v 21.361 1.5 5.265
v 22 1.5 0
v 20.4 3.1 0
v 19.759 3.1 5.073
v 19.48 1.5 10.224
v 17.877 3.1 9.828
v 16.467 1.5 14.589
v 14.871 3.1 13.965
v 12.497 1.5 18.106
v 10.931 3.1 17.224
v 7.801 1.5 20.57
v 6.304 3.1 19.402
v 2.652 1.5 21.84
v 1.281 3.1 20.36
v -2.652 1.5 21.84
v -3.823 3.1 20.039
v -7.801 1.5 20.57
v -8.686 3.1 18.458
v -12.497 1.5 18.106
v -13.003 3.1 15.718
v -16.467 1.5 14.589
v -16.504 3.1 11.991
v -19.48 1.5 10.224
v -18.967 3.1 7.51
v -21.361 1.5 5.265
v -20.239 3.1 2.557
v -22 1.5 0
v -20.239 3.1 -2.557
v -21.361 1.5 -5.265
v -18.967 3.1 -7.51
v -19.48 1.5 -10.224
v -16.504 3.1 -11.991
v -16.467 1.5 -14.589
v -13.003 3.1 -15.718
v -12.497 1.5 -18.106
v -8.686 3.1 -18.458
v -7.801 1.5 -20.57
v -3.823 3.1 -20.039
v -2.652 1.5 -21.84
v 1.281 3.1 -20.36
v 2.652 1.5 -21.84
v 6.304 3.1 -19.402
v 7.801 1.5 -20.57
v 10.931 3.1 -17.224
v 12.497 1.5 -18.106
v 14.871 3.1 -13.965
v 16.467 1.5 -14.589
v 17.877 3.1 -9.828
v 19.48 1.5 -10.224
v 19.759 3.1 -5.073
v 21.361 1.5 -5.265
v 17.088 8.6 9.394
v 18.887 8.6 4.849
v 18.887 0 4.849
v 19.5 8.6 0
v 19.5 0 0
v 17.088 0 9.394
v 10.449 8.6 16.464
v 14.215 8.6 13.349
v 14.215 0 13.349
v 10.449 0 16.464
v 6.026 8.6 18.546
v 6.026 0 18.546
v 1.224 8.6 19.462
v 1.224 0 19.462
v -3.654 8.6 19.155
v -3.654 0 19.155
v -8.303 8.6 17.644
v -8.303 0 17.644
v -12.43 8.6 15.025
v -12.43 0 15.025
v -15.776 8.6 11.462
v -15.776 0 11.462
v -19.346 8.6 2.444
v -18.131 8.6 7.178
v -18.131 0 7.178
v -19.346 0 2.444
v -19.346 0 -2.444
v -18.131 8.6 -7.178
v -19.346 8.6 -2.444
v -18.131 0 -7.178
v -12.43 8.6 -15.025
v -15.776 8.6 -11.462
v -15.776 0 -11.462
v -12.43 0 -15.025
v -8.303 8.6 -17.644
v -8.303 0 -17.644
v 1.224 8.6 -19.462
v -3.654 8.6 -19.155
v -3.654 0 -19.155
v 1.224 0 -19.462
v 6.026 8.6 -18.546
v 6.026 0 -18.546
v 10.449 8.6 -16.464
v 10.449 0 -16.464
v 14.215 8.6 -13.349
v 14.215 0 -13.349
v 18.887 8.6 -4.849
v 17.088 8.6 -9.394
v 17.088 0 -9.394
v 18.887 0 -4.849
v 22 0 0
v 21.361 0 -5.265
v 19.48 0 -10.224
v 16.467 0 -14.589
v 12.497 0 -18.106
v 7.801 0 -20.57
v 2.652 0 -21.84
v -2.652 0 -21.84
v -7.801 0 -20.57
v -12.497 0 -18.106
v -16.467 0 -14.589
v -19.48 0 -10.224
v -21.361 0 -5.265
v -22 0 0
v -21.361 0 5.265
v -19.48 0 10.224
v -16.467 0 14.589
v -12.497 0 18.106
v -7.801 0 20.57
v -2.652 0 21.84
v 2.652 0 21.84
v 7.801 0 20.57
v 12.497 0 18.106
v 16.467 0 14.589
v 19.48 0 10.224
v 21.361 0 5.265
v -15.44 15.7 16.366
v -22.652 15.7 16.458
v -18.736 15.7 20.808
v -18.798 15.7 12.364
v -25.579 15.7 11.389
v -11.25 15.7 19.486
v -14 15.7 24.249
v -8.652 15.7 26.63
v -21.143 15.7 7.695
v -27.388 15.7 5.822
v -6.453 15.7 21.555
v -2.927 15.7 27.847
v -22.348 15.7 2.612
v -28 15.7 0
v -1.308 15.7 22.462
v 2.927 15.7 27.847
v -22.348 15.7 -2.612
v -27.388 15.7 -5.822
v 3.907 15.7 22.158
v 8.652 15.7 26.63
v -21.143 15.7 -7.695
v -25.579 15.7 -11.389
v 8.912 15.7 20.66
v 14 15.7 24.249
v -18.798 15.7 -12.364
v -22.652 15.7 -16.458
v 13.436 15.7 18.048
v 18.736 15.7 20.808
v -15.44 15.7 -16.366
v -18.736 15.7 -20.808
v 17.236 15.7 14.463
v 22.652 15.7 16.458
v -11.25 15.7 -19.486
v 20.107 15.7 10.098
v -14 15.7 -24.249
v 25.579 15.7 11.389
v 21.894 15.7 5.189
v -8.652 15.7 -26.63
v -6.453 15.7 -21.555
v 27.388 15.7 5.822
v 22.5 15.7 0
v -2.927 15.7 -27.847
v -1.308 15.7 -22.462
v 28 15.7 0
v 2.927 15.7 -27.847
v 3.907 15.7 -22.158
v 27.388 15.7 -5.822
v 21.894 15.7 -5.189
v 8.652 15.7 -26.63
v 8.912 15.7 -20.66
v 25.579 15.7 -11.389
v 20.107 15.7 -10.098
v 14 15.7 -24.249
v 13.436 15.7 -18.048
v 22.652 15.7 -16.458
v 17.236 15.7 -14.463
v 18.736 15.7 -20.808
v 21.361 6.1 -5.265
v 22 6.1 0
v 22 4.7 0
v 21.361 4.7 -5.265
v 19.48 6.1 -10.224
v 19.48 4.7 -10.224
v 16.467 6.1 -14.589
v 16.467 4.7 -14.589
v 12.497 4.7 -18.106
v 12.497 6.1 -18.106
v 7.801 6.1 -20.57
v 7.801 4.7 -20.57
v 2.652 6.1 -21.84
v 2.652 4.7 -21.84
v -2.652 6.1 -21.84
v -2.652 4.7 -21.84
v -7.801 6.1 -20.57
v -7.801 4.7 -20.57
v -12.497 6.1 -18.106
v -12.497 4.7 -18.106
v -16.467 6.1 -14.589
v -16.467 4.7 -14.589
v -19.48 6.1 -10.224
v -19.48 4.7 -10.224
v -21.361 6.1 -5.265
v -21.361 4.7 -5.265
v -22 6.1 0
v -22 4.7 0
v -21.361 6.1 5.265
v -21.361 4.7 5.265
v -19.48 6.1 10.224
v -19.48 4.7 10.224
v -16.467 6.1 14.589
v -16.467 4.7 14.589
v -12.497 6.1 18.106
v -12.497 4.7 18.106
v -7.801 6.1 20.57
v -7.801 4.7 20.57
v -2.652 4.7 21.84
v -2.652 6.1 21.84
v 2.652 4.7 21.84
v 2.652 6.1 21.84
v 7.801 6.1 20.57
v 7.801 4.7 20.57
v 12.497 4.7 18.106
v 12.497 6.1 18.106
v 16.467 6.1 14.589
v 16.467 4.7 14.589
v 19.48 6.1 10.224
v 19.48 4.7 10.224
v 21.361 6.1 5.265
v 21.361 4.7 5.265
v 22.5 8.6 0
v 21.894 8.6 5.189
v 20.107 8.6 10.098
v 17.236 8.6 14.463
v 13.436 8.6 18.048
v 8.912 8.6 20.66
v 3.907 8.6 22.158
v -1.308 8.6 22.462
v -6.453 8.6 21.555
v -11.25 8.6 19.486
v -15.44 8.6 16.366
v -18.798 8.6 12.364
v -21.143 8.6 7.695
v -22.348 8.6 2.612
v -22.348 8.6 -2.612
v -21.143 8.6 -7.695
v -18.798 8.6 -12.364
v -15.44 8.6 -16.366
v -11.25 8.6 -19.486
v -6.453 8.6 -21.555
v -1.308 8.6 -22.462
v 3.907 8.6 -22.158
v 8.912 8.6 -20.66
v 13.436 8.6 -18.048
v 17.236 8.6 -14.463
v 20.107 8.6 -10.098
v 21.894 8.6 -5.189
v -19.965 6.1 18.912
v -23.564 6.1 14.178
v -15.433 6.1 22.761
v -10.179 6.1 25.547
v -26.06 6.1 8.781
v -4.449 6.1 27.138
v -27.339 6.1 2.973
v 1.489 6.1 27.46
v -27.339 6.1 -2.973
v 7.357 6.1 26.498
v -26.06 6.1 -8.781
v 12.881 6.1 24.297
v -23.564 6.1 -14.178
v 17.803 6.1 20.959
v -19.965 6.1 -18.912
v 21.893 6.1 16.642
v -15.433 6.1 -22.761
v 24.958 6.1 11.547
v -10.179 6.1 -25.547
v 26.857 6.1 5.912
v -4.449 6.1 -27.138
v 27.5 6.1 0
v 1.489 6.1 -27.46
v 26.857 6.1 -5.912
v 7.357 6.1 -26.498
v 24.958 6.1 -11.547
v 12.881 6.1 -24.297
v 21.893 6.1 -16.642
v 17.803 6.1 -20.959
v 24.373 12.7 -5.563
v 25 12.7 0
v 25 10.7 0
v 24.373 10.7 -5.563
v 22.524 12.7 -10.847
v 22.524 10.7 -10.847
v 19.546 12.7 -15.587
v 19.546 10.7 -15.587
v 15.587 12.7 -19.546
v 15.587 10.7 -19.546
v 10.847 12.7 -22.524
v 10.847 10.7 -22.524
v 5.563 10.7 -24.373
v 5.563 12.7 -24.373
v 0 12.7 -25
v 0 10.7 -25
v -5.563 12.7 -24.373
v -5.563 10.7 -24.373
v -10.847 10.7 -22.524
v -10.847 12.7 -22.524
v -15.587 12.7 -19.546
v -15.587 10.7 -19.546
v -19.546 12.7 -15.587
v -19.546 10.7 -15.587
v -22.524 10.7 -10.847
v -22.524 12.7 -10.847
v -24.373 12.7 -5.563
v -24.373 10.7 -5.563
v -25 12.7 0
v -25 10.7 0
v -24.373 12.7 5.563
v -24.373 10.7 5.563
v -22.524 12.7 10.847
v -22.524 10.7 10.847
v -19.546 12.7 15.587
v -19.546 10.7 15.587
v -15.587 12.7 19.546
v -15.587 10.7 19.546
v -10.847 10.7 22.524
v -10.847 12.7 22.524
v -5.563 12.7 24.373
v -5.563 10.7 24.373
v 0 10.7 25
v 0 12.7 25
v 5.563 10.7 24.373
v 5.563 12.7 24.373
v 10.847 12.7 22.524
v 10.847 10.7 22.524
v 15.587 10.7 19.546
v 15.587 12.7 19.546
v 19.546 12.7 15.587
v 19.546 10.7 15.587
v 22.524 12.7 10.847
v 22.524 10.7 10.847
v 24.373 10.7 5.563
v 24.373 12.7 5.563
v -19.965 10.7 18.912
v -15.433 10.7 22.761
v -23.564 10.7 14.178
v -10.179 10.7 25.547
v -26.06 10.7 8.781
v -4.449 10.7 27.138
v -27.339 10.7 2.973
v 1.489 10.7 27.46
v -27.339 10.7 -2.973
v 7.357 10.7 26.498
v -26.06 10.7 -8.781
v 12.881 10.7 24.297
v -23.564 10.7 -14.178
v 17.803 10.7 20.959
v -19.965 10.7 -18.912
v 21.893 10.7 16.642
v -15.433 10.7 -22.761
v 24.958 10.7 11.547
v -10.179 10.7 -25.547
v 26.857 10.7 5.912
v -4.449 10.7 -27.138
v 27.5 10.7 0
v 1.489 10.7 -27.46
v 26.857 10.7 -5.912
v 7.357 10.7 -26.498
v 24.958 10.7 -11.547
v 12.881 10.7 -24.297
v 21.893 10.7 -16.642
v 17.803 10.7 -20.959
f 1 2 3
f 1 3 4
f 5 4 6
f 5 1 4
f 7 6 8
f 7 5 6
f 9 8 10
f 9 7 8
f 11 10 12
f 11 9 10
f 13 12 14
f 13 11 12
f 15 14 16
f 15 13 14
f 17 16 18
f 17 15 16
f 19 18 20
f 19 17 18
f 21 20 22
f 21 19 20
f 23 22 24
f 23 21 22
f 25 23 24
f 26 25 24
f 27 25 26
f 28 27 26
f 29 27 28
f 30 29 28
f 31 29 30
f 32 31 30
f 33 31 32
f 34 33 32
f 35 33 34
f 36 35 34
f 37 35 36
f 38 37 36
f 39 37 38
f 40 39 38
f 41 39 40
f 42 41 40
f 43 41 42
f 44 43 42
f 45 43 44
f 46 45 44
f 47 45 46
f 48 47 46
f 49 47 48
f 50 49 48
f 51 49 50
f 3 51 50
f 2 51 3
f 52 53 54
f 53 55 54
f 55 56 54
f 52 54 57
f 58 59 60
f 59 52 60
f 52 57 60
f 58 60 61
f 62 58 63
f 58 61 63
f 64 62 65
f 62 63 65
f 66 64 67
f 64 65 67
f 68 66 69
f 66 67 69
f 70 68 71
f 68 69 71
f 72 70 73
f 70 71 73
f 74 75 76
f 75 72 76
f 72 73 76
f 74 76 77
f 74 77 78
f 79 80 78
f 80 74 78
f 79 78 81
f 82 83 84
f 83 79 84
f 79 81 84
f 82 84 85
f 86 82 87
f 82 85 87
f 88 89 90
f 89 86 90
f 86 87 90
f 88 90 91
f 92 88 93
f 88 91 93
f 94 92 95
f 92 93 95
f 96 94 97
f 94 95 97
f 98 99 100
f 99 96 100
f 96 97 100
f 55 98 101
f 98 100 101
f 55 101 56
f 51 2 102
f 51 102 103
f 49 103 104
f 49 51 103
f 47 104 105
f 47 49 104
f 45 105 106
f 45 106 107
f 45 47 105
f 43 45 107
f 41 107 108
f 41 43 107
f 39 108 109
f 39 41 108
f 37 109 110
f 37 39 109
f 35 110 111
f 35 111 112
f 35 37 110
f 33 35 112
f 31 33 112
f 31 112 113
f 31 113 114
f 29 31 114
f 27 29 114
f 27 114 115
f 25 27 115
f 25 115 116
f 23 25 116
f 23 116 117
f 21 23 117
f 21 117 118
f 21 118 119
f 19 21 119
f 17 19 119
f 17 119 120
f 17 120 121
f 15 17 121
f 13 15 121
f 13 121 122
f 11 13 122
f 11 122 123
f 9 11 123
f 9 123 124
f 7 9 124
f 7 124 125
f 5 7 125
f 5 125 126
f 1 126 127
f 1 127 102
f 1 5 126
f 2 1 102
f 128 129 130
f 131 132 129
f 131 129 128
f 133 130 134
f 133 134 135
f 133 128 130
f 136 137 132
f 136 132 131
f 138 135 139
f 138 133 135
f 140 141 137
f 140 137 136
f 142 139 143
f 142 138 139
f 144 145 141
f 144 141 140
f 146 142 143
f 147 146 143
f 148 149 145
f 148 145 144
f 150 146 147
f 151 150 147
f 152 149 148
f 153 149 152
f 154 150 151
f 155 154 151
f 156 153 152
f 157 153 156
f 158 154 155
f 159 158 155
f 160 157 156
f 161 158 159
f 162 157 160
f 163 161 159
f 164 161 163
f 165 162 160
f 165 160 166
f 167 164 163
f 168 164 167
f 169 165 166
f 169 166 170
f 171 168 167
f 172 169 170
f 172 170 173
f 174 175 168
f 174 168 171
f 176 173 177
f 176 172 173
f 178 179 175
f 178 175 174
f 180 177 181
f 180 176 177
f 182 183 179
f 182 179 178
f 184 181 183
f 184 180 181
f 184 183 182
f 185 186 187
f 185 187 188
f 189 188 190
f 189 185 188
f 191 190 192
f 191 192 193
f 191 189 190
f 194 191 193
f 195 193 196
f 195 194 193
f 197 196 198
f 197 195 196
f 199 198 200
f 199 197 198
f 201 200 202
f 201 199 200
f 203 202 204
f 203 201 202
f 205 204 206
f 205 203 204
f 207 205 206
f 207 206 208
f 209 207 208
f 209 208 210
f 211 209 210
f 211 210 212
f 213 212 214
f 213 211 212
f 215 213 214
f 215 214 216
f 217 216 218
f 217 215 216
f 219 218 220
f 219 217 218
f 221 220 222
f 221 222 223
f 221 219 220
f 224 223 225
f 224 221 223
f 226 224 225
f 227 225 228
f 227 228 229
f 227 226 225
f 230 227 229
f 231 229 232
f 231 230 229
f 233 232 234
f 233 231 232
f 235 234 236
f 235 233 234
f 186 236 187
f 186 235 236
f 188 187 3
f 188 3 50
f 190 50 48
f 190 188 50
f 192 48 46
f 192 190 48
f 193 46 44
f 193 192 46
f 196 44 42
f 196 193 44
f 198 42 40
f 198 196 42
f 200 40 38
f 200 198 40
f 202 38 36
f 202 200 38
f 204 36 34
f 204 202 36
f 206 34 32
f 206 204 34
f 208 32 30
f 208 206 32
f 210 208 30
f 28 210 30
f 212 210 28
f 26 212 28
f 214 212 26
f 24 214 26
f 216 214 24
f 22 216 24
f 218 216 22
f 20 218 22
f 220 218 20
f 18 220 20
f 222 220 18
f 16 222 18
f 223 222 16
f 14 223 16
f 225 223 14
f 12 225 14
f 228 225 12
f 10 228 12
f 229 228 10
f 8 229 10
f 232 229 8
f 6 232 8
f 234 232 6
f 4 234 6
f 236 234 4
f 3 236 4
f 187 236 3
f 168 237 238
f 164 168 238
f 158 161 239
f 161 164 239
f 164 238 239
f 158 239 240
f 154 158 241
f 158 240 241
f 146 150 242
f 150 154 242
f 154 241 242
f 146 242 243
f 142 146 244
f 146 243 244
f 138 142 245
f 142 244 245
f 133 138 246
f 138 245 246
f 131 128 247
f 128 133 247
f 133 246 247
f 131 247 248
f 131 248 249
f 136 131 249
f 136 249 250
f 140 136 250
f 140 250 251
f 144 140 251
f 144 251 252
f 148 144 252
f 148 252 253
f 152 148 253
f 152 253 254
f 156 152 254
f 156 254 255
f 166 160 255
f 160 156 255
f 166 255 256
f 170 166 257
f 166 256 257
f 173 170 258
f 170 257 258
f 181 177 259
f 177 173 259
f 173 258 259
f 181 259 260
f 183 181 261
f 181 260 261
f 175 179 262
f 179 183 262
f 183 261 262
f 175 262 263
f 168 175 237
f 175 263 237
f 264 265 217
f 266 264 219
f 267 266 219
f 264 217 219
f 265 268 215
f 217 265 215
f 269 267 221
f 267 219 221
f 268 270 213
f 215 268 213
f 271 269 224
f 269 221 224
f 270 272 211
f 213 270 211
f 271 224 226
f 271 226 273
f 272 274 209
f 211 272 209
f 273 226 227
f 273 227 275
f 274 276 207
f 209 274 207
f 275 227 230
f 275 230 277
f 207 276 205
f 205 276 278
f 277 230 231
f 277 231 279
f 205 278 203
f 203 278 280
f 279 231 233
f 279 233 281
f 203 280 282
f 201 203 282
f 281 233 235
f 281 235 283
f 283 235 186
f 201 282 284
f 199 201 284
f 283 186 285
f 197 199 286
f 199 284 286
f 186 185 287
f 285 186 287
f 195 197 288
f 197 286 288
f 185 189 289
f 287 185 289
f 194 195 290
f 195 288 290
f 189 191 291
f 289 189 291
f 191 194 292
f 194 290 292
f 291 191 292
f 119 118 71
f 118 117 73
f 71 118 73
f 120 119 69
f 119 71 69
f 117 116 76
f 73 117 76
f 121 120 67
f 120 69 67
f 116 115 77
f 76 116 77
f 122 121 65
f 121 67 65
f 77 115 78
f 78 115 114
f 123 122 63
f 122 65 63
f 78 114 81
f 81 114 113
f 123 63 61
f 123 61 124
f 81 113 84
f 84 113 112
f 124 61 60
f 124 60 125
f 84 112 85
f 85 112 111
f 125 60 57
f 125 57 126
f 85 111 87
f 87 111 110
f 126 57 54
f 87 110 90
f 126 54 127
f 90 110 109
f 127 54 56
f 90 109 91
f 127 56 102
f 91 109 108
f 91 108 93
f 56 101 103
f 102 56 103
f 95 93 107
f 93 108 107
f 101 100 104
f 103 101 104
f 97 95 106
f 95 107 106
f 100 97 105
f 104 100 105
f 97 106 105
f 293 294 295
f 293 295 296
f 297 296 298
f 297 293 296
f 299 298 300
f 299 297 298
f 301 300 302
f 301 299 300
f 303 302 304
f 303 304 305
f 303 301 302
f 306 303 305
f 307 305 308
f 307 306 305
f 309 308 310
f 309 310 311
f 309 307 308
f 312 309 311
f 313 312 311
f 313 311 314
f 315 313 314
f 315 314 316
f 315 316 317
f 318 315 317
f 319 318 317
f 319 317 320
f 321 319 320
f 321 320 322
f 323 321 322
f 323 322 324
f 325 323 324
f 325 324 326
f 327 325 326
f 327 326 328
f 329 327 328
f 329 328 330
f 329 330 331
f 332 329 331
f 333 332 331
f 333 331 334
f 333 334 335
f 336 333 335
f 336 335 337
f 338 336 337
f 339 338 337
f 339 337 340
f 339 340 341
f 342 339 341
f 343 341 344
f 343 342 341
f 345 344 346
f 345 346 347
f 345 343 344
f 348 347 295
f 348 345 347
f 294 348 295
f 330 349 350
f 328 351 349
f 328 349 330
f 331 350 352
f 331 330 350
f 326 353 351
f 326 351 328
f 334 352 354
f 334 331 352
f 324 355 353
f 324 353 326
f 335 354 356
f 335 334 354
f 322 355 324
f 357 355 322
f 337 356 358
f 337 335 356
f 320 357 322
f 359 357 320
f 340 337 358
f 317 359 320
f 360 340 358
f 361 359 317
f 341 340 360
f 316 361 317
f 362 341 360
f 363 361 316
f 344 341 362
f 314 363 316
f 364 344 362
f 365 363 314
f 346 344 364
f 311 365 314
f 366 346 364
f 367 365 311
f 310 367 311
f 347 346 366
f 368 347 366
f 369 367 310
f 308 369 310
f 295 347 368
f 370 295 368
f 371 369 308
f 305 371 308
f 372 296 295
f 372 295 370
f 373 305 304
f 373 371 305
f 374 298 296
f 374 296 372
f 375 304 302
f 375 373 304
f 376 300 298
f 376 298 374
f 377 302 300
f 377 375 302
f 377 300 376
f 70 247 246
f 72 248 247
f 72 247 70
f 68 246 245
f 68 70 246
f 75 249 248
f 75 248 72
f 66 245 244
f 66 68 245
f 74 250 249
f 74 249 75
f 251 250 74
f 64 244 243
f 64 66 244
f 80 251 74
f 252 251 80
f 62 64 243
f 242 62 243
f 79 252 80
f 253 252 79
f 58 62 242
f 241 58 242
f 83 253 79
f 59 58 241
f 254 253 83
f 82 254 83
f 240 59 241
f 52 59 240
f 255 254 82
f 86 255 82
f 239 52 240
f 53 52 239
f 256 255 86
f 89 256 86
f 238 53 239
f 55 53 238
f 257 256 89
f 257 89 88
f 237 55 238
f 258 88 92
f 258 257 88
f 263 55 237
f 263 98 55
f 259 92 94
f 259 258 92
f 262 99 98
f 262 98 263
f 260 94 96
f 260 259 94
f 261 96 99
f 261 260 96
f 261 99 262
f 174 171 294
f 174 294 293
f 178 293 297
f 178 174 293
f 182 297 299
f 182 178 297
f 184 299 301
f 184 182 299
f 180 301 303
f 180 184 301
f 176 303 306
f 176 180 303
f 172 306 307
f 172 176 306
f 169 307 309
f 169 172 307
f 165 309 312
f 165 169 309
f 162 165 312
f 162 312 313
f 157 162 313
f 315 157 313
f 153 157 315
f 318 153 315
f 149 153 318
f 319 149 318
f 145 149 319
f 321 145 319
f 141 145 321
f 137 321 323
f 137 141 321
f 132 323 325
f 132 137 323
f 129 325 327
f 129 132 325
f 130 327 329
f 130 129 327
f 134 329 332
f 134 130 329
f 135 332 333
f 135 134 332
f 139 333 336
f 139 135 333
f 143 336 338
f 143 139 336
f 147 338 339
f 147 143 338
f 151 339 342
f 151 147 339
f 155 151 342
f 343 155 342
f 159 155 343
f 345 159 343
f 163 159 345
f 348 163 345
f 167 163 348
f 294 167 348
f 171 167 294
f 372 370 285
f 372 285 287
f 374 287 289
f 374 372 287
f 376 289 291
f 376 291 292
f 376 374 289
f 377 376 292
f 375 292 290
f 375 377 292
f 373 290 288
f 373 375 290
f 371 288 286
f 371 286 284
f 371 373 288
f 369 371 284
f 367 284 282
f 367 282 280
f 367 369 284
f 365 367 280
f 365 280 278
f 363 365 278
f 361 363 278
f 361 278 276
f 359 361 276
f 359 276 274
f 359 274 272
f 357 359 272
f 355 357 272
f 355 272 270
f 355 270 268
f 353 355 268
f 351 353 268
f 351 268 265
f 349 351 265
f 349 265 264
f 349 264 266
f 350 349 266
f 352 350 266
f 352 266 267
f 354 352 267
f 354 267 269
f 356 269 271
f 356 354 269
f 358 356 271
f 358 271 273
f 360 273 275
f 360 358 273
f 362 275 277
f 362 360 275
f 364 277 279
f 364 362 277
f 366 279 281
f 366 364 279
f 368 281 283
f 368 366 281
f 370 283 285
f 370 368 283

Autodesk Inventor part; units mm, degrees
ref_plane "YZ Plane" through (0, 0, 0) normal (1, 0, 0) x (0, 1, 0)
ref_plane "XZ Plane" through (0, 0, 0) normal (0, 1, 0) x (-1, 0, 0)
ref_plane "XY Plane" through (0, 0, 0) normal (0, 0, 1) x (1, 0, 0)
sketch "Sketch1" plane through (0, 0, 0) normal (0, 0, 1) x (1, 0, 0)
  line L0 (0, 0) -> (0, 43.5277) construction
  line L1 (0, 0) -> (22, 0)
  line L2 (22, 0) -> (22, 1.5)
  line L3 (22, 1.5) -> (20.4, 3.1)
  line L4 (20.4, 3.1) -> (22, 4.7)
  line L5 (22, 4.7) -> (22, 6.1)
  line L6 (22, 6.1) -> (27.5, 6.1)
  line L7 (27.5, 6.1) -> (27.5, 10.7)
  line L8 (27.5, 10.7) -> (25, 10.7)
  line L9 (25, 10.7) -> (25, 12.7)
  line L10 (25, 12.7) -> (28, 15.7)
  line L11 (25, 12.7) -> (29.2426, 12.7) construction
  line L12 (28, 15.7) -> (22.5, 15.7)
  line L13 (22.5, 15.7) -> (22.5, 8.6)
  line L14 (22.5, 8.6) -> (19.5, 8.6)
  line L15 (19.5, 8.6) -> (19.5, 0)
  dimension "d0" = 22
  dimension "d1" = 1.5
  dimension "d2" = 135
  dimension "d3" = 90
  dimension "d4" = 3.2
  dimension "d5" = 1.4
  dimension "d6" = 6.1
  dimension "d7" = 27.5
  dimension "d8" = 4.6
  dimension "d11" = 5
  dimension "d12" = 2.5
  dimension "d14" = 2.5
  dimension "d15" = 2.5
  dimension "d17" = 28
  dimension "d18" = 3
  dimension "d19" = 2
revolve "Revolution1" add sketch "Sketch1" angle 360 about axis through (0, 0, 0) along (0, 1, 0)
properties part number "101_Illumination_Adapter_Axiotech_COOLled"
